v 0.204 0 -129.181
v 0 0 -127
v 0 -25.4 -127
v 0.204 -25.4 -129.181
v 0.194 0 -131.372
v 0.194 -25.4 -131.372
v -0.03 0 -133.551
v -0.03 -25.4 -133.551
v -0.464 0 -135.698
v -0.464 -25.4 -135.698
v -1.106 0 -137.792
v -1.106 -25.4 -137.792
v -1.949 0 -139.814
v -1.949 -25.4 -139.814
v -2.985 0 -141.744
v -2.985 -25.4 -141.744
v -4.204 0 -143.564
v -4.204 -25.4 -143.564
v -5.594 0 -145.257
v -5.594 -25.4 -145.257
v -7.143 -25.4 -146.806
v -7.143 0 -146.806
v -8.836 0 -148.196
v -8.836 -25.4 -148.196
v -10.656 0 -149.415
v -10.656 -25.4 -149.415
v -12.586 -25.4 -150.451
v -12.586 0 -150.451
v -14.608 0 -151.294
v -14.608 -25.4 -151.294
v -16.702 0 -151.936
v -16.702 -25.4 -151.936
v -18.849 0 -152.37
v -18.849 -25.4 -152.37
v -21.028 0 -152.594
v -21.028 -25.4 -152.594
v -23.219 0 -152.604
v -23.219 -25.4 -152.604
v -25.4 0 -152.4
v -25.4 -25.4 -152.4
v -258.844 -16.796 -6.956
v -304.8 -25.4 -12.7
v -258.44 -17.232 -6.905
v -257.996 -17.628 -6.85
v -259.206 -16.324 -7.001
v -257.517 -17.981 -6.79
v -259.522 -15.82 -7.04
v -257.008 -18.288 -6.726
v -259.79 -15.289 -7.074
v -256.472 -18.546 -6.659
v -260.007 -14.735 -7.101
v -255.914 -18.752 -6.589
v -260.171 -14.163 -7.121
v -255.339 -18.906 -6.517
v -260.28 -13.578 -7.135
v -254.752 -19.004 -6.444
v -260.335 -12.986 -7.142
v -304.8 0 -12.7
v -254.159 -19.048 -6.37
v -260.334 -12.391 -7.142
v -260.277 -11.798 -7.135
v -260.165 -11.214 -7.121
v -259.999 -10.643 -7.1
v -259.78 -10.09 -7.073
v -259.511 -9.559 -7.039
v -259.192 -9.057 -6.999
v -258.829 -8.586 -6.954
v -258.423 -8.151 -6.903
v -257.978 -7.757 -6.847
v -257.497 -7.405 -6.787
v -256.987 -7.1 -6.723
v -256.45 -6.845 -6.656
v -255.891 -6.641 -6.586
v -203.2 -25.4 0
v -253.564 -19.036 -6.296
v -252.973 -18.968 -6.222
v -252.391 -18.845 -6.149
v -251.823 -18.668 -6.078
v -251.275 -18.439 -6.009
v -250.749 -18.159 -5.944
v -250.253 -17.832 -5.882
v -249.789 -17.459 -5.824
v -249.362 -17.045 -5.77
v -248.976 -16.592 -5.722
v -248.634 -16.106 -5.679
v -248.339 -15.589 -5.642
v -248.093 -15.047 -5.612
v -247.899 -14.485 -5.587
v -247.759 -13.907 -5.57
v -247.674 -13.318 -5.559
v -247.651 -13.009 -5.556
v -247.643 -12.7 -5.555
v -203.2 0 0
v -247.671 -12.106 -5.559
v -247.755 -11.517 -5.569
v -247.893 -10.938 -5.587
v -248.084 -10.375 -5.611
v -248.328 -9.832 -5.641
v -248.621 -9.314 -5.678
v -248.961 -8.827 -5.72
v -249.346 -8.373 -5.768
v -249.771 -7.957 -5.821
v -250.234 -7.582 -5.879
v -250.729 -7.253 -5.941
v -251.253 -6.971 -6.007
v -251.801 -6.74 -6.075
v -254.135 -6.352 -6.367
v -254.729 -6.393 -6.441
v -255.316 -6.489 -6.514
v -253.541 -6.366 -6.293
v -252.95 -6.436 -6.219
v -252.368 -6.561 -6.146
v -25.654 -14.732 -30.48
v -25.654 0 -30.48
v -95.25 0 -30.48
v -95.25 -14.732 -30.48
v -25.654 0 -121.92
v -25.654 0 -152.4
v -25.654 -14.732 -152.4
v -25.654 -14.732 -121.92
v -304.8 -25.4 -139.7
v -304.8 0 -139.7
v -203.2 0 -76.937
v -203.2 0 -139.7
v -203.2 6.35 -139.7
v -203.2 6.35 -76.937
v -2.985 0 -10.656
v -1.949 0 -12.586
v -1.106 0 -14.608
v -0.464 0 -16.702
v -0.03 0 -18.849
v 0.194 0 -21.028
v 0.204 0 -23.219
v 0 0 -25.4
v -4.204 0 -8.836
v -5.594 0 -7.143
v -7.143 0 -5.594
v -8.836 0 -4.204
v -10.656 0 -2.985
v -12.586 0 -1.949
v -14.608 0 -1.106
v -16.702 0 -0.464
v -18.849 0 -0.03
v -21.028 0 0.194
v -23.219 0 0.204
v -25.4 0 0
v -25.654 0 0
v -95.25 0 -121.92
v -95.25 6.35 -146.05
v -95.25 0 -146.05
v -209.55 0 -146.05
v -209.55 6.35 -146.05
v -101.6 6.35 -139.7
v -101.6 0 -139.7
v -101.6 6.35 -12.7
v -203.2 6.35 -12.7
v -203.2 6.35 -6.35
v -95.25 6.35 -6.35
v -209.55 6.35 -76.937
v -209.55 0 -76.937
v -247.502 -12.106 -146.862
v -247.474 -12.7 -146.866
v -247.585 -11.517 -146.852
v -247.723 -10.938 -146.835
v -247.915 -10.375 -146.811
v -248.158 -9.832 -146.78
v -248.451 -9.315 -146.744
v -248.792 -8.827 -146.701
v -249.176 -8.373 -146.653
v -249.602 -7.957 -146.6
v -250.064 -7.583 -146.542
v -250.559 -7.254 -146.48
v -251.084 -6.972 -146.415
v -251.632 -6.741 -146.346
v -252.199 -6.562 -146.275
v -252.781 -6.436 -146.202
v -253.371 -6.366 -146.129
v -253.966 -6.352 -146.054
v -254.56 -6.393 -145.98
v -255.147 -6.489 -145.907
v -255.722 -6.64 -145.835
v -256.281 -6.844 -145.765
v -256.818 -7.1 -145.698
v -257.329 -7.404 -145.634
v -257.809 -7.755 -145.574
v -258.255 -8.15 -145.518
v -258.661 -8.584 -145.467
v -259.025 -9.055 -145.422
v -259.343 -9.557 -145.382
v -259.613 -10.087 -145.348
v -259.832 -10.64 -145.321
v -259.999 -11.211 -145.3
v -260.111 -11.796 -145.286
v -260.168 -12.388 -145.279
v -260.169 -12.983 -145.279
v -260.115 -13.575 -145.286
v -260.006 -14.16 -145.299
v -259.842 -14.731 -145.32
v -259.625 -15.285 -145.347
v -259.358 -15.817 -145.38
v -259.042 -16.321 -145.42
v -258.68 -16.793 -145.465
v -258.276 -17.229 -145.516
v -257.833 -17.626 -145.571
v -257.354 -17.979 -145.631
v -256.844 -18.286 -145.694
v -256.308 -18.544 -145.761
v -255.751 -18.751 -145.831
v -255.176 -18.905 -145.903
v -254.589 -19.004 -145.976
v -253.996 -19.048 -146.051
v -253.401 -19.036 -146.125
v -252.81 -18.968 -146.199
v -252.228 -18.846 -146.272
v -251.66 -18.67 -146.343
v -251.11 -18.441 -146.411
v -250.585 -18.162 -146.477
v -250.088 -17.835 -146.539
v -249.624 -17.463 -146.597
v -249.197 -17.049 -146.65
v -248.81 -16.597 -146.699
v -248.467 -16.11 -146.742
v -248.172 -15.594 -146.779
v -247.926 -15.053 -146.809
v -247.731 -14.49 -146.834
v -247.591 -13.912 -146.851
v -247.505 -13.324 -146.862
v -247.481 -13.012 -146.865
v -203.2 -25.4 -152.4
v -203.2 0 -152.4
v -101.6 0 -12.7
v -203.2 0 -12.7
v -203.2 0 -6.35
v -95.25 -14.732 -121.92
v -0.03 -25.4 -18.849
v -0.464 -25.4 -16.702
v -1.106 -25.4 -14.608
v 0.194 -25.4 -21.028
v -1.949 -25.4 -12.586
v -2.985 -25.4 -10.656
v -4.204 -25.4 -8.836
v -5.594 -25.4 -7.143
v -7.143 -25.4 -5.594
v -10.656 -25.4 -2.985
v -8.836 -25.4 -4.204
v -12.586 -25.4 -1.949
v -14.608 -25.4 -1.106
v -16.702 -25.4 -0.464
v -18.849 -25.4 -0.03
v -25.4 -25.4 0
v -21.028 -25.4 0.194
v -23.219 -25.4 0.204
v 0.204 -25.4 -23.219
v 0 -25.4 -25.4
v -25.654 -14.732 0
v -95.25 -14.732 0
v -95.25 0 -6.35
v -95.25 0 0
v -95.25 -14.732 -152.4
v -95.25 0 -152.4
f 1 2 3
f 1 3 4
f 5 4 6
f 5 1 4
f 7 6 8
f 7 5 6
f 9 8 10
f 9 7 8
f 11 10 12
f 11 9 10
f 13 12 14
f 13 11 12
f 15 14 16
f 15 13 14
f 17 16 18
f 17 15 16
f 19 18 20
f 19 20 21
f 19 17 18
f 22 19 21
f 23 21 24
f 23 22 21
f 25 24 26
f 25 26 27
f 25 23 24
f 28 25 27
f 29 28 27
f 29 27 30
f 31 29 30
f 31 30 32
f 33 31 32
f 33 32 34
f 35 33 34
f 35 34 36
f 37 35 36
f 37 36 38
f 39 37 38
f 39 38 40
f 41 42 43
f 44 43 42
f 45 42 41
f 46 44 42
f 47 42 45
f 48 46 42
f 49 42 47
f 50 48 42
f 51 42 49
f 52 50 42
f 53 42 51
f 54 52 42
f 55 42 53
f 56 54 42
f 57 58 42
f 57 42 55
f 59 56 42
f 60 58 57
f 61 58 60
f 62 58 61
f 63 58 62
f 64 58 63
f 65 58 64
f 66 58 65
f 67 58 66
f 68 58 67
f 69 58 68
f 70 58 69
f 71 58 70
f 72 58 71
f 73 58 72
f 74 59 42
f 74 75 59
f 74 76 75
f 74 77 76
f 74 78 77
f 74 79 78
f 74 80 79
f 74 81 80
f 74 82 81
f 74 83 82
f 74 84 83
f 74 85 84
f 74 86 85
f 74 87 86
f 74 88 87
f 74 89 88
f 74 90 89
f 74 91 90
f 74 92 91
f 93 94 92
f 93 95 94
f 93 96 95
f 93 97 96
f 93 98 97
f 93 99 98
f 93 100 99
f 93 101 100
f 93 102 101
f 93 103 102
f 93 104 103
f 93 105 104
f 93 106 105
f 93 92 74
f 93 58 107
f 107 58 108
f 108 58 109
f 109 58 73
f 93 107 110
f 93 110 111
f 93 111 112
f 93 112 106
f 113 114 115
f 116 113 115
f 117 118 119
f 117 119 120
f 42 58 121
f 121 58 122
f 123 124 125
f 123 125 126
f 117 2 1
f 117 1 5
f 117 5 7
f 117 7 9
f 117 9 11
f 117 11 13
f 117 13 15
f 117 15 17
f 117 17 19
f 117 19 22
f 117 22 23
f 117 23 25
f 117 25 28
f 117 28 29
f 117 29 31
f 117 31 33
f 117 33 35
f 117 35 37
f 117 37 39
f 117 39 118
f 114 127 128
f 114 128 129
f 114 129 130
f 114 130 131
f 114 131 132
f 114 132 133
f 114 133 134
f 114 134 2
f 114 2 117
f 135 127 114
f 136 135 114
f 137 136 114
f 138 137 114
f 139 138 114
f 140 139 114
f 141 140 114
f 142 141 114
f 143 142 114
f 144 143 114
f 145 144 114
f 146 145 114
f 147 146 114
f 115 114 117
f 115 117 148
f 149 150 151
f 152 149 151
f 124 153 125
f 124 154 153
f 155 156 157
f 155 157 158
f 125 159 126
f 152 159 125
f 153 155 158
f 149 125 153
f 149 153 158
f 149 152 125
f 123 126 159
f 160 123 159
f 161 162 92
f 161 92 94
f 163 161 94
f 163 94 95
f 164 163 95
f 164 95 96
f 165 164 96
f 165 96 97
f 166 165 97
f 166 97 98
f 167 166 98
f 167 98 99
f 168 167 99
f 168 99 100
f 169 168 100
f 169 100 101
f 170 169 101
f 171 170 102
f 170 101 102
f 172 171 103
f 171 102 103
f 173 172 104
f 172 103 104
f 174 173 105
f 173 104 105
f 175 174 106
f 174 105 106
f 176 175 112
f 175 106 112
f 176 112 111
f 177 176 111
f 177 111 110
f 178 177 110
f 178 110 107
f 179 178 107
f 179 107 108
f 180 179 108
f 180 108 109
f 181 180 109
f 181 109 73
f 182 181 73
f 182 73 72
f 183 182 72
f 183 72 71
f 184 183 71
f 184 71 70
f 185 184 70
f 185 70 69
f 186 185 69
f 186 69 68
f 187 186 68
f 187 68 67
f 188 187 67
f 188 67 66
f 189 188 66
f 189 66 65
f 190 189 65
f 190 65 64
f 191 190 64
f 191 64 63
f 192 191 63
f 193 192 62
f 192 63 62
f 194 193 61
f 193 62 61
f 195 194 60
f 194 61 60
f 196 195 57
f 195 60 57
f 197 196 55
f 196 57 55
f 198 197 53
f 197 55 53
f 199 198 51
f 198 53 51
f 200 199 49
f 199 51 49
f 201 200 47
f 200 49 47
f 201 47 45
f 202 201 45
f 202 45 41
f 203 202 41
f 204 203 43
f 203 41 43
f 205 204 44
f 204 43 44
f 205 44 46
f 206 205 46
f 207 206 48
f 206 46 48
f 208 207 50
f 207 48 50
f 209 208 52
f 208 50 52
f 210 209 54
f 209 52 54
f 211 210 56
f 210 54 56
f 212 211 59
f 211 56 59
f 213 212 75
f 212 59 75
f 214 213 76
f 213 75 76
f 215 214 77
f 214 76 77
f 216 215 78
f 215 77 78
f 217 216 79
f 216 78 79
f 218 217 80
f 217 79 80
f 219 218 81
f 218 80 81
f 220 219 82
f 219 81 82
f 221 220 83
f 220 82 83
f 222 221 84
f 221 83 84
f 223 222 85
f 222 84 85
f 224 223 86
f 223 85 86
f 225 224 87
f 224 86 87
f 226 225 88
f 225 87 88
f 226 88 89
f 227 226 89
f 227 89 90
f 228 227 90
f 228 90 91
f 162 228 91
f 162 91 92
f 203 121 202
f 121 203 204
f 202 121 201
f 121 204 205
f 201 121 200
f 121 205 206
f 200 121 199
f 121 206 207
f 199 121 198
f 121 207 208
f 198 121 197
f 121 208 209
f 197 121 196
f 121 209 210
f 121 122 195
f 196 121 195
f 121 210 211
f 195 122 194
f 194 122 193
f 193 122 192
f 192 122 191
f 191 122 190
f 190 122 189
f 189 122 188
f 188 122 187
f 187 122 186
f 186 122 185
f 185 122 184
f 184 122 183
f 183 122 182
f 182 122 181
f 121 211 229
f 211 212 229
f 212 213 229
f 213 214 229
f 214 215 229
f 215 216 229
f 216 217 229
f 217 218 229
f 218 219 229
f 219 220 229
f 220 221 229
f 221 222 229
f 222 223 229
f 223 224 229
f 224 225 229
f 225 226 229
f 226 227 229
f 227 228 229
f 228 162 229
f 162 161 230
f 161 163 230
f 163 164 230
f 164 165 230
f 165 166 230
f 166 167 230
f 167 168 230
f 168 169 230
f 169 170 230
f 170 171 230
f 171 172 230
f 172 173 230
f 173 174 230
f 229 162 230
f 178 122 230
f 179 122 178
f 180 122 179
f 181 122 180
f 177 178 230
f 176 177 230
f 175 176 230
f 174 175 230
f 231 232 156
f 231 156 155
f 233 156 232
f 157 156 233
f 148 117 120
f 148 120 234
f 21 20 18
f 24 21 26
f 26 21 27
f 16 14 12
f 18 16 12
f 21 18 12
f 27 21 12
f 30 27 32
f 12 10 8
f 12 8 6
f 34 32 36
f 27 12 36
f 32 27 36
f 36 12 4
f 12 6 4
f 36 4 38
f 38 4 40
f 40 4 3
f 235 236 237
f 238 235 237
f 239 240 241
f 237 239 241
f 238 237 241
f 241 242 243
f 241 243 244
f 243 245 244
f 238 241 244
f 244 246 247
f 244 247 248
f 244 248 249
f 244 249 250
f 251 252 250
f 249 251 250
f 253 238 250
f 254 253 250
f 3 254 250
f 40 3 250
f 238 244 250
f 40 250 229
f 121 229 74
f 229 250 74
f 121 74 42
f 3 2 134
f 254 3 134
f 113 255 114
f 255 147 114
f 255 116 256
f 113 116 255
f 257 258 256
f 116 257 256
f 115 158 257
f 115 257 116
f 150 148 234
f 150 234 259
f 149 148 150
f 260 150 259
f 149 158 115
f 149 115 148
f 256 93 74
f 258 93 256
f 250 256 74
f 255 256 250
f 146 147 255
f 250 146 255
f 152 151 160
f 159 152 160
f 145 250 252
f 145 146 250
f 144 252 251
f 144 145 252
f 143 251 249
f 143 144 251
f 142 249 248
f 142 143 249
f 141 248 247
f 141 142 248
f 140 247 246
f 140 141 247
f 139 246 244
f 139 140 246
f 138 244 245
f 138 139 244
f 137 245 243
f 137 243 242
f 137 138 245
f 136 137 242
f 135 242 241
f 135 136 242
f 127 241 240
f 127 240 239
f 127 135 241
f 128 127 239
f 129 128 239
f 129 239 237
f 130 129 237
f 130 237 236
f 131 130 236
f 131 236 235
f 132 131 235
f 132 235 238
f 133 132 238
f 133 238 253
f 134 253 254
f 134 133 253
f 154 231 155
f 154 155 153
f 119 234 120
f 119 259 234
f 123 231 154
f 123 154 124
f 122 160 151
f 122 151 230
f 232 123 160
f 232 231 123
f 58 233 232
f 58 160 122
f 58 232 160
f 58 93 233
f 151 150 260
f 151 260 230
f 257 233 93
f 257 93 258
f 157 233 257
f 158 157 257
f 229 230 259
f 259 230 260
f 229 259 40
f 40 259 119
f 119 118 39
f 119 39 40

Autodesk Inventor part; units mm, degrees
ref_plane "YZ Plane" through (0, 0, 0) normal (1, 0, 0) x (0, 1, 0)
sketch "Sketch1" plane through (0, 0, 0) normal (0, 1, 0) x (-1, 0, 0)
  line L0 (304.8, -139.7) -> (203.2, -152.4)
  line L1 (304.8, -12.7) -> (203.2, 0)
  line L2 (304.8, -12.7) -> (304.8, -139.7)
  arc A0 (25.4, 0) -> (0, -25.4) centre (22.225, -22.225) ccw
  line L3 (203.2, 0) -> (25.4, 0)
  arc A1 (0, -127) -> (25.4, -152.4) centre (22.225, -130.175) ccw
  line L4 (203.2, -152.4) -> (25.4, -152.4)
  line L5 (0, -127) -> (0, -25.4)
  point P0 (0, 0)
  point P1 (203.2, -12.7)
  point P2 (203.2, -139.7)
  point P3 (101.6, -12.7)
  point P4 (101.6, -139.7)
  point P5 (101.6, -152.4)
  point P6 (0, -139.7)
  dimension "d8" = 12.7
  dimension "d12" = 101.6
  dimension "d13" = 127
extrude "Extrusion1" add sketch "Sketch1" against normal blind 25.4
sketch "Sketch2" plane through (0, 0, 0) normal (0, 1, 0) x (1, 0, 0)
  line L0 (-25.4, 0) -> (-203.2, 0) projected
  line L1 (-203.2, 152.4) -> (-25.4, 152.4) projected
  line L2 (-203.2, 12.7) -> (-101.6, 12.7)
  line L3 (-101.6, 12.7) -> (-101.6, 139.7)
  line L4 (-101.6, 139.7) -> (-203.2, 139.7)
  line L5 (-203.2, 139.7) -> (-203.2, 12.7)
  line L6 (-209.55, 6.35) -> (-95.25, 6.35)
  line L7 (-95.25, 6.35) -> (-95.25, 146.05)
  line L8 (-95.25, 146.05) -> (-209.55, 146.05)
  line L9 (-209.55, 146.05) -> (-209.55, 6.35)
  point P0 (0, 0)
  point P1 (-203.2, 6.35)
  dimension "d23" = 12.7
  dimension "d24" = 101.6
  dimension "d25" = 127
  dimension "d26" = 6.35
  dimension "d27" = 6.35
  dimension "d28" = 114.3
  dimension "d29" = 139.7
extrude "Extrusion2" add sketch "Sketch2" along normal blind 6.35
ref_plane "Work Plane1" through (-203.2, 0, 0) normal (-0.0012, 0, 1) x (1, 0, 0.0012)
sketch "Sketch7" plane through (-203.2, 0, 0) normal (-0.0012, 0, 1) x (1, 0, 0.0012)
  line L0 (0, 0) -> (0, -25.4) projected
  line L1 (0, -25.4) -> (-101.6158, -25.4) projected
  circle A0 centre (-50.8, -12.7) radius 6.35
  point P0 (203.1998, 0)
  dimension "d41" = 50.8
  dimension "d43" = 12.7
  dimension "d44" = 12.7
extrude "Extrusion4" cut sketch "Sketch7" against normal blind 152.4
ref_plane "Work Plane3" through (-22.225, 0, -152.6256) normal (0, 0, -1) x (-1, 0, 0)
sketch "Sketch11" plane through (0, 0, 0) normal (0, 1, 0) x (1, 0, 0)
  line L0 (-95.25, 0) -> (-25.654, 0)
  line L1 (-25.654, 0) -> (-25.654, 30.48)
  line L2 (-25.654, 30.48) -> (-95.25, 30.48)
  line L3 (-95.25, 30.48) -> (-95.25, 0)
  line L4 (-95.25, 6.35) -> (-95.25, 146.05) projected
  line L5 (-95.25, 152.4) -> (-25.654, 152.4)
  line L6 (-25.654, 152.4) -> (-25.654, 121.92)
  line L7 (-25.654, 121.92) -> (-95.25, 121.92)
  line L8 (-95.25, 121.92) -> (-95.25, 152.4)
  point P0 (0, 0)
  dimension "d59" = 69.596
  dimension "d60" = 30.48
  dimension "d61" = 69.596
  dimension "d62" = 30.48
extrude "Extrusion7" cut sketch "Sketch11" against normal blind 14.732
sketch "Sketch12" plane through (0, 6.35, 0) normal (0, 1, 0) x (1, 0, 0)
  line L0 (-203.2, 22.5806) -> (-203.2, 76.9366)
  line L1 (-203.2, 76.9366) -> (-209.55, 76.9366)
  line L2 (-209.55, 76.9366) -> (-209.55, 22.5806)
  line L3 (-209.55, 76.9366) -> (-203.2, 76.9366)
  line L4 (-203.2, 76.9366) -> (-203.2, 6.35)
  line L5 (-203.2, 6.35) -> (-209.55, 6.35)
  line L6 (-209.55, 6.35) -> (-209.55, 76.9366)
  point P0 (0, 0)
  point P1 (-203.2, 12.7)
  point P2 (-209.55, 6.35)
  point P3 (-209.55, 12.7)
  dimension "d67" = 9.8806
  dimension "d68" = 6.35
  dimension "d69" = 54.356
extrude "Extrusion9" cut sketch "Sketch12" against normal blind 6.35
properties part number "RC_Chassis"
